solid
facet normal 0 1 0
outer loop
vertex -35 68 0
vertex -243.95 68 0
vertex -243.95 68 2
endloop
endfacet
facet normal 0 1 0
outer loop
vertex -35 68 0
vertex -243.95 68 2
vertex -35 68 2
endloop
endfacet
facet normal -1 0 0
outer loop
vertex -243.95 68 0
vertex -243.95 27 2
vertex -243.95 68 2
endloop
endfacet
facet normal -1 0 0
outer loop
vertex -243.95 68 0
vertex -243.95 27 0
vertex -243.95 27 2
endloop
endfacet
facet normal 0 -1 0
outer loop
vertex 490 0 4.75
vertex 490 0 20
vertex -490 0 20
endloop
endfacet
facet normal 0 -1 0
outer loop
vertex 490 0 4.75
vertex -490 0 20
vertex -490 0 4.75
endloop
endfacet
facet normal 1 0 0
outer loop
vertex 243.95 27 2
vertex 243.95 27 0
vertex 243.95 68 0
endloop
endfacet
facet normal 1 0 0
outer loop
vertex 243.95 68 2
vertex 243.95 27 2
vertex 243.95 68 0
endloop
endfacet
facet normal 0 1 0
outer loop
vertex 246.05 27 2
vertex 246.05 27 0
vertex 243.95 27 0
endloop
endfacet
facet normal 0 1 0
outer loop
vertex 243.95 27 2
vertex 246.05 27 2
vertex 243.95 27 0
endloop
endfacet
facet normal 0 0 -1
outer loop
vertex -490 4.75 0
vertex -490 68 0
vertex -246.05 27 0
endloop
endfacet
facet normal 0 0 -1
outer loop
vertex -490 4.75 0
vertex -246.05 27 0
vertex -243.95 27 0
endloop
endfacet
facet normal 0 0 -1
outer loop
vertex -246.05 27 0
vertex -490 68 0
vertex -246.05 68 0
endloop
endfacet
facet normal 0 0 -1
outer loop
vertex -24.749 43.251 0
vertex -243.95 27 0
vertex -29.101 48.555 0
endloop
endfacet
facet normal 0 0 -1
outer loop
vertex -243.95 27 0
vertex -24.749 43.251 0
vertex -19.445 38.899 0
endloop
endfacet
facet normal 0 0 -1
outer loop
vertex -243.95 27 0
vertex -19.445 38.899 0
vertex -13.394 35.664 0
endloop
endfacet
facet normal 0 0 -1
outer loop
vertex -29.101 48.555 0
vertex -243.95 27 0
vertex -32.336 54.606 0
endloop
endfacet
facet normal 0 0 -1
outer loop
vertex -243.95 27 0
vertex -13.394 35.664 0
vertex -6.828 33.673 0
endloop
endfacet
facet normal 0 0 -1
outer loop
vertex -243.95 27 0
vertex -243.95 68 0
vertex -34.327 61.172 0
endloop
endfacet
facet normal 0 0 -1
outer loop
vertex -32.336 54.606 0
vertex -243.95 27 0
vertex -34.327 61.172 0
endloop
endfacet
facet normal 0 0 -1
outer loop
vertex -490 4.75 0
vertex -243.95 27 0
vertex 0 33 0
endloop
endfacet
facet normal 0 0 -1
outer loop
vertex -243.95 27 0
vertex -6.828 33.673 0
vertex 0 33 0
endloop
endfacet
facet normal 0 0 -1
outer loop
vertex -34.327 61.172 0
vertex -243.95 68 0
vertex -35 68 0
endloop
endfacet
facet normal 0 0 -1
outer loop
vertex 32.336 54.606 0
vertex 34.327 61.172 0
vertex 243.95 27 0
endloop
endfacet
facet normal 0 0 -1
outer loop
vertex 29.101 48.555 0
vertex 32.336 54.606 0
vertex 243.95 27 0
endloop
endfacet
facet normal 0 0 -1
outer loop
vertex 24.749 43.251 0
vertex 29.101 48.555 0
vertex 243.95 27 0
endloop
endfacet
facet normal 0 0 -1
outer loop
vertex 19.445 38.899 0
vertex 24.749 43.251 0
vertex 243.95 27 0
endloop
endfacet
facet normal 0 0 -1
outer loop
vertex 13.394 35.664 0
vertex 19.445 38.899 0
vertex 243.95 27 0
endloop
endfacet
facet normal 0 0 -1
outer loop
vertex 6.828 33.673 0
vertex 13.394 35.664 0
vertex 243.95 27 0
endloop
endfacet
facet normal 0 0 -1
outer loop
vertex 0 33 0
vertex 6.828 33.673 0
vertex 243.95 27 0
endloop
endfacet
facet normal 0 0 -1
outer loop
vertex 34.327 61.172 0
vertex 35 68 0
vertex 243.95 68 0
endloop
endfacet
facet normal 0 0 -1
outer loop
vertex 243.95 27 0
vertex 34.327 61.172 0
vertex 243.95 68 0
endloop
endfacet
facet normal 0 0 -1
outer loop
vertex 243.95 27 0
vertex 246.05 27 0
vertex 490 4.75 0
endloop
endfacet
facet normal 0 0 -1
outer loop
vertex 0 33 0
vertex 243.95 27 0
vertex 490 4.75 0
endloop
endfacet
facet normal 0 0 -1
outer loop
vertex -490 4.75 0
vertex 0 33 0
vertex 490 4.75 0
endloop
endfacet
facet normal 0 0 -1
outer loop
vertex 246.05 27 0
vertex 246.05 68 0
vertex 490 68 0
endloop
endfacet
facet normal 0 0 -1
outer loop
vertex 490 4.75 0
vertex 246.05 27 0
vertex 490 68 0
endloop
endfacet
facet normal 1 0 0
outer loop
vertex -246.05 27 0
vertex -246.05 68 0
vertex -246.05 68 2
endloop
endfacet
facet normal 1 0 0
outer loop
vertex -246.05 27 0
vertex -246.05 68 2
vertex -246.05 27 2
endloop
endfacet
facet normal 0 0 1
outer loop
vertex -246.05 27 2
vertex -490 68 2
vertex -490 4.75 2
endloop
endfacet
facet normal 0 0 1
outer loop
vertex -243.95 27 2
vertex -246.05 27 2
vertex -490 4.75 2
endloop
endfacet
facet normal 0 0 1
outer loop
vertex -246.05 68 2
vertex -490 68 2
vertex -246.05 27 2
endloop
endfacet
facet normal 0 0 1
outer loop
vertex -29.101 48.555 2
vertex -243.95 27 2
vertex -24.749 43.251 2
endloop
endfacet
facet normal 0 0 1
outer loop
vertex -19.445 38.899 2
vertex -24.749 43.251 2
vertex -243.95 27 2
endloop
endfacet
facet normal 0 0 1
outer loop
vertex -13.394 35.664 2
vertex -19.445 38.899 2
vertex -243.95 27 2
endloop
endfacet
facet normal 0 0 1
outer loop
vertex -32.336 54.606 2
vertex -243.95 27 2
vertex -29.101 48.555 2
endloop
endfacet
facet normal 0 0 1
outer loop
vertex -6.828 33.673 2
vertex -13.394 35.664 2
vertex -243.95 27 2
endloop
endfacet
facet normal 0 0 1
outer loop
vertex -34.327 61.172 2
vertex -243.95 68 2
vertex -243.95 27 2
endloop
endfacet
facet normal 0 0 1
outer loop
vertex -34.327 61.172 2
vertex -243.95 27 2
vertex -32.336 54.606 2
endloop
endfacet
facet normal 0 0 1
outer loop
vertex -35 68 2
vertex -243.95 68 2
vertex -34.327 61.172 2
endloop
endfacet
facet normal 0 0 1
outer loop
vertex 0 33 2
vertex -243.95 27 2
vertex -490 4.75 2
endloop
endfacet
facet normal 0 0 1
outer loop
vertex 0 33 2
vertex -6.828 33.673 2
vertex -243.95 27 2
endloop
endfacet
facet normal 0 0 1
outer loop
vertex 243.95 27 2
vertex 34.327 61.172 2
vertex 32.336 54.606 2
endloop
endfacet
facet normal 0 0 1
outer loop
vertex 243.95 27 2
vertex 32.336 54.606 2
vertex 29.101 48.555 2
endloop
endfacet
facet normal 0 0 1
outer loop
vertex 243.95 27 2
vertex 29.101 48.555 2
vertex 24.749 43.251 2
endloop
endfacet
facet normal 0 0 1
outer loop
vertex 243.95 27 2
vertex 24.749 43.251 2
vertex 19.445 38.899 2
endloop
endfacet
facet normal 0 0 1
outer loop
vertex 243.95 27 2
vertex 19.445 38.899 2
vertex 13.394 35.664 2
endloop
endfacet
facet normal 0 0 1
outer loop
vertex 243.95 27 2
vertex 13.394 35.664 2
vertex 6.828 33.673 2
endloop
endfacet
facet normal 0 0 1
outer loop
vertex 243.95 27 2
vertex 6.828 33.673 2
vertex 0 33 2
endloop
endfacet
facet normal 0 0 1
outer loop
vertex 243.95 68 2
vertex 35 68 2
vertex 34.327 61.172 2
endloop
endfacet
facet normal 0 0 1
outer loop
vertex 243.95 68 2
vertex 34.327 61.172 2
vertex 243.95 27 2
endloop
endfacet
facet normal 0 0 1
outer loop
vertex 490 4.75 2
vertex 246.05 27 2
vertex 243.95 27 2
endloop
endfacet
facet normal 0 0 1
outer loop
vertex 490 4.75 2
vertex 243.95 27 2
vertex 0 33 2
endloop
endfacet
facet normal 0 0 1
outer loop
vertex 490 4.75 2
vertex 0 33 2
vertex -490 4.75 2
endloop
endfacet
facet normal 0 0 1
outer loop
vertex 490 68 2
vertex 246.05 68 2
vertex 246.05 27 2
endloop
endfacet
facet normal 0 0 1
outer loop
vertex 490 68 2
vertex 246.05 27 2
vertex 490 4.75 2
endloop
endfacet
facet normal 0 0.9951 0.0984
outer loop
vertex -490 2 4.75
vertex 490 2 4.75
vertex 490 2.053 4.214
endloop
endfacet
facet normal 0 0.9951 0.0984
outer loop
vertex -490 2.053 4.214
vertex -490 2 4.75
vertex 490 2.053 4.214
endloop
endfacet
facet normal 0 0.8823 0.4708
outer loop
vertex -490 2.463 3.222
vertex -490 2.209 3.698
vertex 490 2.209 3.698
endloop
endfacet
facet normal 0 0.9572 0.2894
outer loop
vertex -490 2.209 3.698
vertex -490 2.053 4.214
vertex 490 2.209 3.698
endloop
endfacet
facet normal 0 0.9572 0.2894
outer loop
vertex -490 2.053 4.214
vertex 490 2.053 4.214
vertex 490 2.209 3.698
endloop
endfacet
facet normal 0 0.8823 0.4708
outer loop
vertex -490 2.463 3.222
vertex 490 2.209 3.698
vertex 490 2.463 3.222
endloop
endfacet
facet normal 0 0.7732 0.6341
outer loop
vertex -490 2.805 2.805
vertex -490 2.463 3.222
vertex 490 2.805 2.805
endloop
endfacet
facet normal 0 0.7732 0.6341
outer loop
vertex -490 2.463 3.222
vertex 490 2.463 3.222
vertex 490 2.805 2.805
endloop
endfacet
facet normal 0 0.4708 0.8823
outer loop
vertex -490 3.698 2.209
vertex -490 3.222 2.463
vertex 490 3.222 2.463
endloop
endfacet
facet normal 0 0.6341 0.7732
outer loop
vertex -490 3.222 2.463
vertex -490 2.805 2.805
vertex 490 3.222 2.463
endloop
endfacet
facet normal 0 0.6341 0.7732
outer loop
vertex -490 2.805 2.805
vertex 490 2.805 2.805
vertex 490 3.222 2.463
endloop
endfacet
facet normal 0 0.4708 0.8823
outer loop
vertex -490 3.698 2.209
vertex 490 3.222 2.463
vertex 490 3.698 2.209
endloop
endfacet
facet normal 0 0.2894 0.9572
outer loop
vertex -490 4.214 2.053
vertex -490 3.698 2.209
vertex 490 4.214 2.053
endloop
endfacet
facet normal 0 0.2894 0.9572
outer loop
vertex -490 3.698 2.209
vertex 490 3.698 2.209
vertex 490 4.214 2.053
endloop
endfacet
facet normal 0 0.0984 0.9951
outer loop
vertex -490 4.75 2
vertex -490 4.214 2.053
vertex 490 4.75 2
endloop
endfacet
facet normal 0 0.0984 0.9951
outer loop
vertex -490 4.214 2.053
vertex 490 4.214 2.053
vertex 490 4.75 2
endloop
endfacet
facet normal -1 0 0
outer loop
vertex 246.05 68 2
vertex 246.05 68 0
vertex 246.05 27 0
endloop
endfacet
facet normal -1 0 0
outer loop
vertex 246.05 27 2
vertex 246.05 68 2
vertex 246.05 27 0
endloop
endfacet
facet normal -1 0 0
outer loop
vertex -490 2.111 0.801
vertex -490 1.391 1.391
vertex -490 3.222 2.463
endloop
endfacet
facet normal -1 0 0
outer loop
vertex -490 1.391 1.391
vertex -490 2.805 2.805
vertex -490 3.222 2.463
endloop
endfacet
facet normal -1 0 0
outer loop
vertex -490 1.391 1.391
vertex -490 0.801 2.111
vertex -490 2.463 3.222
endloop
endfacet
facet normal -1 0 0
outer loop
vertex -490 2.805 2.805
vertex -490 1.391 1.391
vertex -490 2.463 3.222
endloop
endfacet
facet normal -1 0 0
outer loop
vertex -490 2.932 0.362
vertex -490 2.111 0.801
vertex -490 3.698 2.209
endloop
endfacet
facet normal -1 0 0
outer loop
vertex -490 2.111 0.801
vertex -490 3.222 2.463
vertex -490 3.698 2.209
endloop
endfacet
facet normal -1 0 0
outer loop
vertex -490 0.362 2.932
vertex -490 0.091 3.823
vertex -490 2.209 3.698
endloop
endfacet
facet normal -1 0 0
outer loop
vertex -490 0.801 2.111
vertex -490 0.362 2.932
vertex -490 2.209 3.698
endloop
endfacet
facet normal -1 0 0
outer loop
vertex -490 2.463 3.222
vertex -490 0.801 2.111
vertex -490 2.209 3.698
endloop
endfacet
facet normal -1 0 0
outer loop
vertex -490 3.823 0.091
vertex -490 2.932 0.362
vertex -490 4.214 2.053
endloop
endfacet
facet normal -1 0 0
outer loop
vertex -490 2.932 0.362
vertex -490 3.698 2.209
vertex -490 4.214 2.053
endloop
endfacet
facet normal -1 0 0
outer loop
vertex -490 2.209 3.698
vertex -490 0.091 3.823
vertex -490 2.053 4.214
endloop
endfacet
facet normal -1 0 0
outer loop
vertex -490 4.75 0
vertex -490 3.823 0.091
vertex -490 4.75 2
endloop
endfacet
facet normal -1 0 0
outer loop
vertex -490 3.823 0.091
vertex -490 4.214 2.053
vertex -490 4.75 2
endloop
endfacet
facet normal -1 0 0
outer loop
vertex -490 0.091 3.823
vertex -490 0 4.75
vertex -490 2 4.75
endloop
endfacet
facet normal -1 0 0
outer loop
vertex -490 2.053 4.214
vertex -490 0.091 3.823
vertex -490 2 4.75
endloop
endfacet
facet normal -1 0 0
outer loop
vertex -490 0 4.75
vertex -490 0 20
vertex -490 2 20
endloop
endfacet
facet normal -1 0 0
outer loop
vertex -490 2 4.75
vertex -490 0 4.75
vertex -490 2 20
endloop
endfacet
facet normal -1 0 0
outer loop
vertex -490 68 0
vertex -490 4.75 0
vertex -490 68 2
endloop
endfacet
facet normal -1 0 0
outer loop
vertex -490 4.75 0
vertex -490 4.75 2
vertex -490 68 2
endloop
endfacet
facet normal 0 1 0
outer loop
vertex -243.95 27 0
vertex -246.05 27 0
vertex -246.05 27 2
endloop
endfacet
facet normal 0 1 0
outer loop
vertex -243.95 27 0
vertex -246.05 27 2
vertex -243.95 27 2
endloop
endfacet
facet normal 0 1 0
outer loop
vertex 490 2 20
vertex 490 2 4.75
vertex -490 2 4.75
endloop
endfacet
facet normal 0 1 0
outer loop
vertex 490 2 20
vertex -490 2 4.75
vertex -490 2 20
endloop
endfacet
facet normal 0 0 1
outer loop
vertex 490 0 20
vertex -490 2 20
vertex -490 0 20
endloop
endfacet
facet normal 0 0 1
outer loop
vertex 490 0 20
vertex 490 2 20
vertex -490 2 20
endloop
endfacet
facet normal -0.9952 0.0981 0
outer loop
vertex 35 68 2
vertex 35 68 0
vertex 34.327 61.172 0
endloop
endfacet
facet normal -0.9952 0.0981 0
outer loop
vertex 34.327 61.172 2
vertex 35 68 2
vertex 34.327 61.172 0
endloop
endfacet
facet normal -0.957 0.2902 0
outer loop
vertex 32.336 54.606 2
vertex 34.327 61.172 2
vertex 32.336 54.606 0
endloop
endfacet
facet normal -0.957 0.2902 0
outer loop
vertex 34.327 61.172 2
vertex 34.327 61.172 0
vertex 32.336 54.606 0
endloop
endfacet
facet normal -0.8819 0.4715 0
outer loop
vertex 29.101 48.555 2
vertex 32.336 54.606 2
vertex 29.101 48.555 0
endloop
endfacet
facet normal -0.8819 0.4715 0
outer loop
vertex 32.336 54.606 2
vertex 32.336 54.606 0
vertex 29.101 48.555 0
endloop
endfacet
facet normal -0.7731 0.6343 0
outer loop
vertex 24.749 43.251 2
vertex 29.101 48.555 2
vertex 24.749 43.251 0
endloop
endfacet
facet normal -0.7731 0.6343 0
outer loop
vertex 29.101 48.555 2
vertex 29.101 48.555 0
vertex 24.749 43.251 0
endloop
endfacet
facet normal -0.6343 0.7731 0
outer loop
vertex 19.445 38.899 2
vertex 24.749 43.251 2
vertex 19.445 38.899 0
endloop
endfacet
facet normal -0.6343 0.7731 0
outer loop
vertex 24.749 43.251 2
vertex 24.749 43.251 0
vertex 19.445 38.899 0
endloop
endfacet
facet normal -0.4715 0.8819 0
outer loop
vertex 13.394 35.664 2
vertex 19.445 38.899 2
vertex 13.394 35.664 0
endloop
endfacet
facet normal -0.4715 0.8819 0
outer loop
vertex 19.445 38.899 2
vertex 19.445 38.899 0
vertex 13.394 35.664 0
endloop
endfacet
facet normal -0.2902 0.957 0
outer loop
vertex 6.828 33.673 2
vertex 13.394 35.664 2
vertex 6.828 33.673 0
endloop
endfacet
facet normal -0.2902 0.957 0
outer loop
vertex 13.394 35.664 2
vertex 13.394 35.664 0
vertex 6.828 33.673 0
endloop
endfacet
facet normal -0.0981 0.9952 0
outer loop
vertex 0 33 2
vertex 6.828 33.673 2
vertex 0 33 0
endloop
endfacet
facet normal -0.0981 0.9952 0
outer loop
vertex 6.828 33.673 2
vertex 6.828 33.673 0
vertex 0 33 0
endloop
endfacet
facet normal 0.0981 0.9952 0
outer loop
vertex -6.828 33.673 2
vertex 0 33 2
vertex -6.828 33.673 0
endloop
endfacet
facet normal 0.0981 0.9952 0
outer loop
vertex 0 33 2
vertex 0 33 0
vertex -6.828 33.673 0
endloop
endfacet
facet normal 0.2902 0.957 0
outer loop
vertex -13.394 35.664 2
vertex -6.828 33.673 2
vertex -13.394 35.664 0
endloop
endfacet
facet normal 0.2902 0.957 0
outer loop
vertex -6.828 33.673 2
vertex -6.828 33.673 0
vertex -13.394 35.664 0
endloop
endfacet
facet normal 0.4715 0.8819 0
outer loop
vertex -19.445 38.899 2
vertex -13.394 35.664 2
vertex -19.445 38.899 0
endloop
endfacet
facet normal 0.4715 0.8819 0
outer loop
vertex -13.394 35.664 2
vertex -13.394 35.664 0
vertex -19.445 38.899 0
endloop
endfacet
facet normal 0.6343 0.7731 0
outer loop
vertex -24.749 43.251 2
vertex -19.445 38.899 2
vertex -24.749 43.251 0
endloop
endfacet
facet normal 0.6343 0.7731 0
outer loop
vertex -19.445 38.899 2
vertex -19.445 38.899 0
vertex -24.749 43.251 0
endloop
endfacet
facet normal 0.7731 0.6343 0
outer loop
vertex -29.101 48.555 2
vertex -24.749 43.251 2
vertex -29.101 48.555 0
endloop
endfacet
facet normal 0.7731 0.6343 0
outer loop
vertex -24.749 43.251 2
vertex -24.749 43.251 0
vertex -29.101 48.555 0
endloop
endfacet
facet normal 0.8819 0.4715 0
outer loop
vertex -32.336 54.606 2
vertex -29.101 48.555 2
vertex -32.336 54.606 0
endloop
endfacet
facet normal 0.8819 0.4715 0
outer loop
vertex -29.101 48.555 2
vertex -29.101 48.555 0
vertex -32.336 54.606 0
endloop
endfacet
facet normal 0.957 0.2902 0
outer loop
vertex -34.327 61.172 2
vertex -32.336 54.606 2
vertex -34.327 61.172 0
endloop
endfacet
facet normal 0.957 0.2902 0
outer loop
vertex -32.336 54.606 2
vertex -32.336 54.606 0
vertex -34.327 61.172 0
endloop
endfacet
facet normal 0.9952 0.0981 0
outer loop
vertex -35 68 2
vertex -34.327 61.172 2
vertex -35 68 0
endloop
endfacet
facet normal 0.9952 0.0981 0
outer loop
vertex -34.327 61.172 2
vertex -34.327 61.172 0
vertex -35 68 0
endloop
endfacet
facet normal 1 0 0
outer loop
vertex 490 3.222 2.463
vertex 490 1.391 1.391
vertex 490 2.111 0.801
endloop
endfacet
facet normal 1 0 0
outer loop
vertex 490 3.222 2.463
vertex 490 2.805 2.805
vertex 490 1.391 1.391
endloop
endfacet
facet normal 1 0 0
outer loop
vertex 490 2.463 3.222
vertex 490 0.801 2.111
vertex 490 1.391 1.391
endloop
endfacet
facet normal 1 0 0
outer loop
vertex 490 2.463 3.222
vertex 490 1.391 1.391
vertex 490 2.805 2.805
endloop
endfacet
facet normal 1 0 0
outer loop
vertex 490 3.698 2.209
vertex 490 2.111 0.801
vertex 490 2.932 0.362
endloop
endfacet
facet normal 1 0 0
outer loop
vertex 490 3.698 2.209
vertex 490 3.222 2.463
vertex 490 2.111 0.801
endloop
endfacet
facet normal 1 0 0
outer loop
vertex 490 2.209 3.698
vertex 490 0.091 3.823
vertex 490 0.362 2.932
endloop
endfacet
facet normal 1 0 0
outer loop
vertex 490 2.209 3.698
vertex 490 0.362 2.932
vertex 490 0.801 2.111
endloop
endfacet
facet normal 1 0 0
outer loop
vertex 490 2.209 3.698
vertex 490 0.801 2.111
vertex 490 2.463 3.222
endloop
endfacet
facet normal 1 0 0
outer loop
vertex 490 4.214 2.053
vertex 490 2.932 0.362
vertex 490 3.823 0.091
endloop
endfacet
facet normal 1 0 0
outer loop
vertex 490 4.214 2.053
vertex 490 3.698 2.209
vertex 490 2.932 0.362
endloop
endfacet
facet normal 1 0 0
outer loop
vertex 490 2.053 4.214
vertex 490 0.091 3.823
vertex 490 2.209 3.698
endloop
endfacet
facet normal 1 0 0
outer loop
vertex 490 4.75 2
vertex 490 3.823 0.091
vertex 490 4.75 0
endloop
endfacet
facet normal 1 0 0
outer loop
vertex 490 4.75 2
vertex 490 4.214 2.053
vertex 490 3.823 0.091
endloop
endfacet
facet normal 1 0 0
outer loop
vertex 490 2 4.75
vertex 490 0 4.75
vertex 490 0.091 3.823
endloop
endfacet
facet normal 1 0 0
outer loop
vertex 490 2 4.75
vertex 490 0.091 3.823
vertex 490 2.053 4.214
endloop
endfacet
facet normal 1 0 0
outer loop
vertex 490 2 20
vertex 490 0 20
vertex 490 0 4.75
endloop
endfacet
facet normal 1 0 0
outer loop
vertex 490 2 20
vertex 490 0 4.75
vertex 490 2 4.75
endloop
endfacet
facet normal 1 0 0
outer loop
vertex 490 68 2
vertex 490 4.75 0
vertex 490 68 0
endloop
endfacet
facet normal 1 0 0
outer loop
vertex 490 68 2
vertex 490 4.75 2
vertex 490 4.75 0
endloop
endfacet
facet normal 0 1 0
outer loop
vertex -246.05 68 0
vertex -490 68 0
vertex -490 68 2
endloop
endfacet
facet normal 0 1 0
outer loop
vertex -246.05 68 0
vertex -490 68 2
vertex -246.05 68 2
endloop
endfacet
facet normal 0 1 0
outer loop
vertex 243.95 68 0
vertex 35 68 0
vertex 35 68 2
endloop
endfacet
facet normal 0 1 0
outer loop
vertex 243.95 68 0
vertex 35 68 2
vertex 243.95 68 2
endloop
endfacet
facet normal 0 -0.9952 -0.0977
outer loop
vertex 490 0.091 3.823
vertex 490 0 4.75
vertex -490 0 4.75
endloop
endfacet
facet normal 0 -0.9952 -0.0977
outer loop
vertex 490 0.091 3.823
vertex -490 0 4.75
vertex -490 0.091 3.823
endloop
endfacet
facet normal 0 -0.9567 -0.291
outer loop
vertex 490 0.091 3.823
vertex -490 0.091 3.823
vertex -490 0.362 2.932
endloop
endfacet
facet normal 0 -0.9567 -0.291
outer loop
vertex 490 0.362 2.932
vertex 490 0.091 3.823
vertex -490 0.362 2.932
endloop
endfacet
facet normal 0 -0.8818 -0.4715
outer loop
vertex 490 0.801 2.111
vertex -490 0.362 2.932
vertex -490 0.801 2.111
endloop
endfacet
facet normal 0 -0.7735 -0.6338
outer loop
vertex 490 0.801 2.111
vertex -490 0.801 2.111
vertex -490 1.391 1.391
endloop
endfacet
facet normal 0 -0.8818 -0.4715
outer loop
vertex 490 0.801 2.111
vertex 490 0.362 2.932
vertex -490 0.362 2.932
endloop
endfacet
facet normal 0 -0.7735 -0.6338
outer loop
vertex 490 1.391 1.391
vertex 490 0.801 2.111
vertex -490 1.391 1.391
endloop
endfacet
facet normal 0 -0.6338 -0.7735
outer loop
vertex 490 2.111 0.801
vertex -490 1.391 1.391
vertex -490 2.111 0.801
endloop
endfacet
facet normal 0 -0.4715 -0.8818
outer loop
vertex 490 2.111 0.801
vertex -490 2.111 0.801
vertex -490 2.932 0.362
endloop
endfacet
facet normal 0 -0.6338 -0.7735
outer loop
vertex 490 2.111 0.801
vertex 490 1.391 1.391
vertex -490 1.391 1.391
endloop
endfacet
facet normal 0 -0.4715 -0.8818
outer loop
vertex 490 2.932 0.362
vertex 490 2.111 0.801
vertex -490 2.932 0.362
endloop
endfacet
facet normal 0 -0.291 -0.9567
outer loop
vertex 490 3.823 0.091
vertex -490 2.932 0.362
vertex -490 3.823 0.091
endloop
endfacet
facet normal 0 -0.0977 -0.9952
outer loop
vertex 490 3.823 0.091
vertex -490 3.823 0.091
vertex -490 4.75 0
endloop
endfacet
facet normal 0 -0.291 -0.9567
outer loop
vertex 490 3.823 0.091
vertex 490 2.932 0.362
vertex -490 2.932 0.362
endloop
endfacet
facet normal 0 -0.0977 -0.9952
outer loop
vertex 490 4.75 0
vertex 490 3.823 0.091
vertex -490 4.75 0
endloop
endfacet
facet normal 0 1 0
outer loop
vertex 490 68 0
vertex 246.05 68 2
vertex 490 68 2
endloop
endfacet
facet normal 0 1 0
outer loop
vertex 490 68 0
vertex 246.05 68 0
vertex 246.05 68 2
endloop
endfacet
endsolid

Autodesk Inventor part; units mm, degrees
ref_plane "YZ Plane" through (0, 0, 0) normal (1, 0, 0) x (0, 1, 0)
ref_plane "XZ Plane" through (0, 0, 0) normal (0, 1, 0) x (-1, 0, 0)
ref_plane "XY Plane" through (0, 0, 0) normal (0, 0, 1) x (1, 0, 0)
sketch "Sketch1" plane through (0, 0, 0) normal (0, 0, 1) x (1, 0, 0)
  line L0 (-490, 68) -> (490, 68)
  line L1 (490, 68) -> (490, 0)
  line L2 (490, 0) -> (-490, 0)
  line L3 (-490, 0) -> (-490, 68)
  point P0 (0, 0)
  point P1 (0, 0)
  dimension "d0" = 980
  dimension "d1" = 68
extrude "Plate1" add sketch "Sketch1" along normal blind 2
sketch "Sketch2" plane through (490, 2, 0) normal (0, -1, 0) x (1, 0, 0)
  line L0 (-980, 0) -> (0, 0)
  line L1 (0, 0) -> (0, 20)
  line L2 (0, 20) -> (-980, 20)
  line L3 (-980, 20) -> (-980, 0)
edge flange "Flange1" height 20 angle 90 thickness 2 bend radius 2.75 thickness toward (0, -1, 0) relief round relief width 2 relief depth 1 edges at (0, 0, 2) wall of the first edge with corners at (-490, 2, 0) (490, 2, 0) (490, 2, 20) (-490, 2, 20)
bend "Bend1"
corner "Corner1"
sketch "Sketch5" plane through (0, 0, 0) normal (0, 0, -1) x (-1, 0, 0)
  line L0 (490, 68) -> (-490, 68) projected
  line L1 (490, 0) -> (-490, 0) projected
  circle A0 centre (0, 68) radius 35
  line L2 (243.95, 68) -> (246.05, 68)
  line L3 (246.05, 68) -> (246.05, 27)
  line L4 (246.05, 27) -> (243.95, 27)
  line L5 (243.95, 27) -> (243.95, 68)
  line L6 (-243.95, 68) -> (-246.05, 68)
  line L7 (-246.05, 68) -> (-246.05, 27)
  line L8 (-246.05, 27) -> (-243.95, 27)
  line L9 (-243.95, 27) -> (-243.95, 68)
  line L10 (0, 68) -> (0, 0) construction
  point P0 (0, 0)
  point P1 (245, 27)
  point P2 (-245, 27)
  point P3 (-35, 68)
  point P4 (35, 68)
  dimension "d45" = 70
  dimension "d48" = 2.1
  dimension "d49" = 490
  dimension "d51" = 27
  dimension "d52" = 41
extrude "Extrusion1" cut sketch "Sketch5" against normal through all contours L3 L4 L5 L0 | L9 L8 L7 L0 | A0 L0 picked at (-5.3545, 54.8926)
sketch "Sketch9" plane through (0, 0, 2) normal (0, 0, 1) x (1, 0, 0)
  line L0 (485.6141, 29.596) -> (485.6141, 17.596) construction
  line L1 (485.6141, 17.596) -> (285.6141, 17.596) construction
  line L2 (285.6141, 17.596) -> (285.6141, 29.596) construction
  line L3 (285.6141, 29.596) -> (485.6141, 29.596) construction
  line L4 (-490, 68) -> (490, 68) projected
  point P0 (0, 0)
  point P1 (1.05, 68)
  dimension "d40" = 200
  dimension "d41" = 12
mark "Mark2"
equation "\"d1\" = СПИНА_Стрингер_2_высота"
equation "\"d2\" = Thickness"
equation "\"d3\" = BendReliefWidth"
equation "\"d4\" = BendReliefDepth"
equation "\"d5\" = MinimumRemnant"
equation "\"d6\" = TransitionRadius"
equation "\"d9\" = BendRadius"
equation "\"d10\" = CornerReliefSize"
equation "\"d11\" = GapSize"
equation "\"d12\" = JacobiRadiusSize"
equation "\"BendReliefWidth\" = Thickness"
equation "\"BendReliefDepth\" = 0.5 * Thickness"
equation "\"CornerReliefSize\" = 4 * Thickness"
equation "\"MinimumRemnant\" = 2 * Thickness"
equation "\"TransitionRadius\" = BendRadius"
equation "\"JacobiRadiusSize\" = BendRadius"
equation "\"GapSize\" = Thickness"
equation "\"СПИНА_Стрингер_2_высота\" = 68"
equation "\"Thickness\" = 2"
equation "\"BendRadius\" = 2.75"
properties part number "MSC 206 STRINGER BACK ^^" material "Stainless Steel"
